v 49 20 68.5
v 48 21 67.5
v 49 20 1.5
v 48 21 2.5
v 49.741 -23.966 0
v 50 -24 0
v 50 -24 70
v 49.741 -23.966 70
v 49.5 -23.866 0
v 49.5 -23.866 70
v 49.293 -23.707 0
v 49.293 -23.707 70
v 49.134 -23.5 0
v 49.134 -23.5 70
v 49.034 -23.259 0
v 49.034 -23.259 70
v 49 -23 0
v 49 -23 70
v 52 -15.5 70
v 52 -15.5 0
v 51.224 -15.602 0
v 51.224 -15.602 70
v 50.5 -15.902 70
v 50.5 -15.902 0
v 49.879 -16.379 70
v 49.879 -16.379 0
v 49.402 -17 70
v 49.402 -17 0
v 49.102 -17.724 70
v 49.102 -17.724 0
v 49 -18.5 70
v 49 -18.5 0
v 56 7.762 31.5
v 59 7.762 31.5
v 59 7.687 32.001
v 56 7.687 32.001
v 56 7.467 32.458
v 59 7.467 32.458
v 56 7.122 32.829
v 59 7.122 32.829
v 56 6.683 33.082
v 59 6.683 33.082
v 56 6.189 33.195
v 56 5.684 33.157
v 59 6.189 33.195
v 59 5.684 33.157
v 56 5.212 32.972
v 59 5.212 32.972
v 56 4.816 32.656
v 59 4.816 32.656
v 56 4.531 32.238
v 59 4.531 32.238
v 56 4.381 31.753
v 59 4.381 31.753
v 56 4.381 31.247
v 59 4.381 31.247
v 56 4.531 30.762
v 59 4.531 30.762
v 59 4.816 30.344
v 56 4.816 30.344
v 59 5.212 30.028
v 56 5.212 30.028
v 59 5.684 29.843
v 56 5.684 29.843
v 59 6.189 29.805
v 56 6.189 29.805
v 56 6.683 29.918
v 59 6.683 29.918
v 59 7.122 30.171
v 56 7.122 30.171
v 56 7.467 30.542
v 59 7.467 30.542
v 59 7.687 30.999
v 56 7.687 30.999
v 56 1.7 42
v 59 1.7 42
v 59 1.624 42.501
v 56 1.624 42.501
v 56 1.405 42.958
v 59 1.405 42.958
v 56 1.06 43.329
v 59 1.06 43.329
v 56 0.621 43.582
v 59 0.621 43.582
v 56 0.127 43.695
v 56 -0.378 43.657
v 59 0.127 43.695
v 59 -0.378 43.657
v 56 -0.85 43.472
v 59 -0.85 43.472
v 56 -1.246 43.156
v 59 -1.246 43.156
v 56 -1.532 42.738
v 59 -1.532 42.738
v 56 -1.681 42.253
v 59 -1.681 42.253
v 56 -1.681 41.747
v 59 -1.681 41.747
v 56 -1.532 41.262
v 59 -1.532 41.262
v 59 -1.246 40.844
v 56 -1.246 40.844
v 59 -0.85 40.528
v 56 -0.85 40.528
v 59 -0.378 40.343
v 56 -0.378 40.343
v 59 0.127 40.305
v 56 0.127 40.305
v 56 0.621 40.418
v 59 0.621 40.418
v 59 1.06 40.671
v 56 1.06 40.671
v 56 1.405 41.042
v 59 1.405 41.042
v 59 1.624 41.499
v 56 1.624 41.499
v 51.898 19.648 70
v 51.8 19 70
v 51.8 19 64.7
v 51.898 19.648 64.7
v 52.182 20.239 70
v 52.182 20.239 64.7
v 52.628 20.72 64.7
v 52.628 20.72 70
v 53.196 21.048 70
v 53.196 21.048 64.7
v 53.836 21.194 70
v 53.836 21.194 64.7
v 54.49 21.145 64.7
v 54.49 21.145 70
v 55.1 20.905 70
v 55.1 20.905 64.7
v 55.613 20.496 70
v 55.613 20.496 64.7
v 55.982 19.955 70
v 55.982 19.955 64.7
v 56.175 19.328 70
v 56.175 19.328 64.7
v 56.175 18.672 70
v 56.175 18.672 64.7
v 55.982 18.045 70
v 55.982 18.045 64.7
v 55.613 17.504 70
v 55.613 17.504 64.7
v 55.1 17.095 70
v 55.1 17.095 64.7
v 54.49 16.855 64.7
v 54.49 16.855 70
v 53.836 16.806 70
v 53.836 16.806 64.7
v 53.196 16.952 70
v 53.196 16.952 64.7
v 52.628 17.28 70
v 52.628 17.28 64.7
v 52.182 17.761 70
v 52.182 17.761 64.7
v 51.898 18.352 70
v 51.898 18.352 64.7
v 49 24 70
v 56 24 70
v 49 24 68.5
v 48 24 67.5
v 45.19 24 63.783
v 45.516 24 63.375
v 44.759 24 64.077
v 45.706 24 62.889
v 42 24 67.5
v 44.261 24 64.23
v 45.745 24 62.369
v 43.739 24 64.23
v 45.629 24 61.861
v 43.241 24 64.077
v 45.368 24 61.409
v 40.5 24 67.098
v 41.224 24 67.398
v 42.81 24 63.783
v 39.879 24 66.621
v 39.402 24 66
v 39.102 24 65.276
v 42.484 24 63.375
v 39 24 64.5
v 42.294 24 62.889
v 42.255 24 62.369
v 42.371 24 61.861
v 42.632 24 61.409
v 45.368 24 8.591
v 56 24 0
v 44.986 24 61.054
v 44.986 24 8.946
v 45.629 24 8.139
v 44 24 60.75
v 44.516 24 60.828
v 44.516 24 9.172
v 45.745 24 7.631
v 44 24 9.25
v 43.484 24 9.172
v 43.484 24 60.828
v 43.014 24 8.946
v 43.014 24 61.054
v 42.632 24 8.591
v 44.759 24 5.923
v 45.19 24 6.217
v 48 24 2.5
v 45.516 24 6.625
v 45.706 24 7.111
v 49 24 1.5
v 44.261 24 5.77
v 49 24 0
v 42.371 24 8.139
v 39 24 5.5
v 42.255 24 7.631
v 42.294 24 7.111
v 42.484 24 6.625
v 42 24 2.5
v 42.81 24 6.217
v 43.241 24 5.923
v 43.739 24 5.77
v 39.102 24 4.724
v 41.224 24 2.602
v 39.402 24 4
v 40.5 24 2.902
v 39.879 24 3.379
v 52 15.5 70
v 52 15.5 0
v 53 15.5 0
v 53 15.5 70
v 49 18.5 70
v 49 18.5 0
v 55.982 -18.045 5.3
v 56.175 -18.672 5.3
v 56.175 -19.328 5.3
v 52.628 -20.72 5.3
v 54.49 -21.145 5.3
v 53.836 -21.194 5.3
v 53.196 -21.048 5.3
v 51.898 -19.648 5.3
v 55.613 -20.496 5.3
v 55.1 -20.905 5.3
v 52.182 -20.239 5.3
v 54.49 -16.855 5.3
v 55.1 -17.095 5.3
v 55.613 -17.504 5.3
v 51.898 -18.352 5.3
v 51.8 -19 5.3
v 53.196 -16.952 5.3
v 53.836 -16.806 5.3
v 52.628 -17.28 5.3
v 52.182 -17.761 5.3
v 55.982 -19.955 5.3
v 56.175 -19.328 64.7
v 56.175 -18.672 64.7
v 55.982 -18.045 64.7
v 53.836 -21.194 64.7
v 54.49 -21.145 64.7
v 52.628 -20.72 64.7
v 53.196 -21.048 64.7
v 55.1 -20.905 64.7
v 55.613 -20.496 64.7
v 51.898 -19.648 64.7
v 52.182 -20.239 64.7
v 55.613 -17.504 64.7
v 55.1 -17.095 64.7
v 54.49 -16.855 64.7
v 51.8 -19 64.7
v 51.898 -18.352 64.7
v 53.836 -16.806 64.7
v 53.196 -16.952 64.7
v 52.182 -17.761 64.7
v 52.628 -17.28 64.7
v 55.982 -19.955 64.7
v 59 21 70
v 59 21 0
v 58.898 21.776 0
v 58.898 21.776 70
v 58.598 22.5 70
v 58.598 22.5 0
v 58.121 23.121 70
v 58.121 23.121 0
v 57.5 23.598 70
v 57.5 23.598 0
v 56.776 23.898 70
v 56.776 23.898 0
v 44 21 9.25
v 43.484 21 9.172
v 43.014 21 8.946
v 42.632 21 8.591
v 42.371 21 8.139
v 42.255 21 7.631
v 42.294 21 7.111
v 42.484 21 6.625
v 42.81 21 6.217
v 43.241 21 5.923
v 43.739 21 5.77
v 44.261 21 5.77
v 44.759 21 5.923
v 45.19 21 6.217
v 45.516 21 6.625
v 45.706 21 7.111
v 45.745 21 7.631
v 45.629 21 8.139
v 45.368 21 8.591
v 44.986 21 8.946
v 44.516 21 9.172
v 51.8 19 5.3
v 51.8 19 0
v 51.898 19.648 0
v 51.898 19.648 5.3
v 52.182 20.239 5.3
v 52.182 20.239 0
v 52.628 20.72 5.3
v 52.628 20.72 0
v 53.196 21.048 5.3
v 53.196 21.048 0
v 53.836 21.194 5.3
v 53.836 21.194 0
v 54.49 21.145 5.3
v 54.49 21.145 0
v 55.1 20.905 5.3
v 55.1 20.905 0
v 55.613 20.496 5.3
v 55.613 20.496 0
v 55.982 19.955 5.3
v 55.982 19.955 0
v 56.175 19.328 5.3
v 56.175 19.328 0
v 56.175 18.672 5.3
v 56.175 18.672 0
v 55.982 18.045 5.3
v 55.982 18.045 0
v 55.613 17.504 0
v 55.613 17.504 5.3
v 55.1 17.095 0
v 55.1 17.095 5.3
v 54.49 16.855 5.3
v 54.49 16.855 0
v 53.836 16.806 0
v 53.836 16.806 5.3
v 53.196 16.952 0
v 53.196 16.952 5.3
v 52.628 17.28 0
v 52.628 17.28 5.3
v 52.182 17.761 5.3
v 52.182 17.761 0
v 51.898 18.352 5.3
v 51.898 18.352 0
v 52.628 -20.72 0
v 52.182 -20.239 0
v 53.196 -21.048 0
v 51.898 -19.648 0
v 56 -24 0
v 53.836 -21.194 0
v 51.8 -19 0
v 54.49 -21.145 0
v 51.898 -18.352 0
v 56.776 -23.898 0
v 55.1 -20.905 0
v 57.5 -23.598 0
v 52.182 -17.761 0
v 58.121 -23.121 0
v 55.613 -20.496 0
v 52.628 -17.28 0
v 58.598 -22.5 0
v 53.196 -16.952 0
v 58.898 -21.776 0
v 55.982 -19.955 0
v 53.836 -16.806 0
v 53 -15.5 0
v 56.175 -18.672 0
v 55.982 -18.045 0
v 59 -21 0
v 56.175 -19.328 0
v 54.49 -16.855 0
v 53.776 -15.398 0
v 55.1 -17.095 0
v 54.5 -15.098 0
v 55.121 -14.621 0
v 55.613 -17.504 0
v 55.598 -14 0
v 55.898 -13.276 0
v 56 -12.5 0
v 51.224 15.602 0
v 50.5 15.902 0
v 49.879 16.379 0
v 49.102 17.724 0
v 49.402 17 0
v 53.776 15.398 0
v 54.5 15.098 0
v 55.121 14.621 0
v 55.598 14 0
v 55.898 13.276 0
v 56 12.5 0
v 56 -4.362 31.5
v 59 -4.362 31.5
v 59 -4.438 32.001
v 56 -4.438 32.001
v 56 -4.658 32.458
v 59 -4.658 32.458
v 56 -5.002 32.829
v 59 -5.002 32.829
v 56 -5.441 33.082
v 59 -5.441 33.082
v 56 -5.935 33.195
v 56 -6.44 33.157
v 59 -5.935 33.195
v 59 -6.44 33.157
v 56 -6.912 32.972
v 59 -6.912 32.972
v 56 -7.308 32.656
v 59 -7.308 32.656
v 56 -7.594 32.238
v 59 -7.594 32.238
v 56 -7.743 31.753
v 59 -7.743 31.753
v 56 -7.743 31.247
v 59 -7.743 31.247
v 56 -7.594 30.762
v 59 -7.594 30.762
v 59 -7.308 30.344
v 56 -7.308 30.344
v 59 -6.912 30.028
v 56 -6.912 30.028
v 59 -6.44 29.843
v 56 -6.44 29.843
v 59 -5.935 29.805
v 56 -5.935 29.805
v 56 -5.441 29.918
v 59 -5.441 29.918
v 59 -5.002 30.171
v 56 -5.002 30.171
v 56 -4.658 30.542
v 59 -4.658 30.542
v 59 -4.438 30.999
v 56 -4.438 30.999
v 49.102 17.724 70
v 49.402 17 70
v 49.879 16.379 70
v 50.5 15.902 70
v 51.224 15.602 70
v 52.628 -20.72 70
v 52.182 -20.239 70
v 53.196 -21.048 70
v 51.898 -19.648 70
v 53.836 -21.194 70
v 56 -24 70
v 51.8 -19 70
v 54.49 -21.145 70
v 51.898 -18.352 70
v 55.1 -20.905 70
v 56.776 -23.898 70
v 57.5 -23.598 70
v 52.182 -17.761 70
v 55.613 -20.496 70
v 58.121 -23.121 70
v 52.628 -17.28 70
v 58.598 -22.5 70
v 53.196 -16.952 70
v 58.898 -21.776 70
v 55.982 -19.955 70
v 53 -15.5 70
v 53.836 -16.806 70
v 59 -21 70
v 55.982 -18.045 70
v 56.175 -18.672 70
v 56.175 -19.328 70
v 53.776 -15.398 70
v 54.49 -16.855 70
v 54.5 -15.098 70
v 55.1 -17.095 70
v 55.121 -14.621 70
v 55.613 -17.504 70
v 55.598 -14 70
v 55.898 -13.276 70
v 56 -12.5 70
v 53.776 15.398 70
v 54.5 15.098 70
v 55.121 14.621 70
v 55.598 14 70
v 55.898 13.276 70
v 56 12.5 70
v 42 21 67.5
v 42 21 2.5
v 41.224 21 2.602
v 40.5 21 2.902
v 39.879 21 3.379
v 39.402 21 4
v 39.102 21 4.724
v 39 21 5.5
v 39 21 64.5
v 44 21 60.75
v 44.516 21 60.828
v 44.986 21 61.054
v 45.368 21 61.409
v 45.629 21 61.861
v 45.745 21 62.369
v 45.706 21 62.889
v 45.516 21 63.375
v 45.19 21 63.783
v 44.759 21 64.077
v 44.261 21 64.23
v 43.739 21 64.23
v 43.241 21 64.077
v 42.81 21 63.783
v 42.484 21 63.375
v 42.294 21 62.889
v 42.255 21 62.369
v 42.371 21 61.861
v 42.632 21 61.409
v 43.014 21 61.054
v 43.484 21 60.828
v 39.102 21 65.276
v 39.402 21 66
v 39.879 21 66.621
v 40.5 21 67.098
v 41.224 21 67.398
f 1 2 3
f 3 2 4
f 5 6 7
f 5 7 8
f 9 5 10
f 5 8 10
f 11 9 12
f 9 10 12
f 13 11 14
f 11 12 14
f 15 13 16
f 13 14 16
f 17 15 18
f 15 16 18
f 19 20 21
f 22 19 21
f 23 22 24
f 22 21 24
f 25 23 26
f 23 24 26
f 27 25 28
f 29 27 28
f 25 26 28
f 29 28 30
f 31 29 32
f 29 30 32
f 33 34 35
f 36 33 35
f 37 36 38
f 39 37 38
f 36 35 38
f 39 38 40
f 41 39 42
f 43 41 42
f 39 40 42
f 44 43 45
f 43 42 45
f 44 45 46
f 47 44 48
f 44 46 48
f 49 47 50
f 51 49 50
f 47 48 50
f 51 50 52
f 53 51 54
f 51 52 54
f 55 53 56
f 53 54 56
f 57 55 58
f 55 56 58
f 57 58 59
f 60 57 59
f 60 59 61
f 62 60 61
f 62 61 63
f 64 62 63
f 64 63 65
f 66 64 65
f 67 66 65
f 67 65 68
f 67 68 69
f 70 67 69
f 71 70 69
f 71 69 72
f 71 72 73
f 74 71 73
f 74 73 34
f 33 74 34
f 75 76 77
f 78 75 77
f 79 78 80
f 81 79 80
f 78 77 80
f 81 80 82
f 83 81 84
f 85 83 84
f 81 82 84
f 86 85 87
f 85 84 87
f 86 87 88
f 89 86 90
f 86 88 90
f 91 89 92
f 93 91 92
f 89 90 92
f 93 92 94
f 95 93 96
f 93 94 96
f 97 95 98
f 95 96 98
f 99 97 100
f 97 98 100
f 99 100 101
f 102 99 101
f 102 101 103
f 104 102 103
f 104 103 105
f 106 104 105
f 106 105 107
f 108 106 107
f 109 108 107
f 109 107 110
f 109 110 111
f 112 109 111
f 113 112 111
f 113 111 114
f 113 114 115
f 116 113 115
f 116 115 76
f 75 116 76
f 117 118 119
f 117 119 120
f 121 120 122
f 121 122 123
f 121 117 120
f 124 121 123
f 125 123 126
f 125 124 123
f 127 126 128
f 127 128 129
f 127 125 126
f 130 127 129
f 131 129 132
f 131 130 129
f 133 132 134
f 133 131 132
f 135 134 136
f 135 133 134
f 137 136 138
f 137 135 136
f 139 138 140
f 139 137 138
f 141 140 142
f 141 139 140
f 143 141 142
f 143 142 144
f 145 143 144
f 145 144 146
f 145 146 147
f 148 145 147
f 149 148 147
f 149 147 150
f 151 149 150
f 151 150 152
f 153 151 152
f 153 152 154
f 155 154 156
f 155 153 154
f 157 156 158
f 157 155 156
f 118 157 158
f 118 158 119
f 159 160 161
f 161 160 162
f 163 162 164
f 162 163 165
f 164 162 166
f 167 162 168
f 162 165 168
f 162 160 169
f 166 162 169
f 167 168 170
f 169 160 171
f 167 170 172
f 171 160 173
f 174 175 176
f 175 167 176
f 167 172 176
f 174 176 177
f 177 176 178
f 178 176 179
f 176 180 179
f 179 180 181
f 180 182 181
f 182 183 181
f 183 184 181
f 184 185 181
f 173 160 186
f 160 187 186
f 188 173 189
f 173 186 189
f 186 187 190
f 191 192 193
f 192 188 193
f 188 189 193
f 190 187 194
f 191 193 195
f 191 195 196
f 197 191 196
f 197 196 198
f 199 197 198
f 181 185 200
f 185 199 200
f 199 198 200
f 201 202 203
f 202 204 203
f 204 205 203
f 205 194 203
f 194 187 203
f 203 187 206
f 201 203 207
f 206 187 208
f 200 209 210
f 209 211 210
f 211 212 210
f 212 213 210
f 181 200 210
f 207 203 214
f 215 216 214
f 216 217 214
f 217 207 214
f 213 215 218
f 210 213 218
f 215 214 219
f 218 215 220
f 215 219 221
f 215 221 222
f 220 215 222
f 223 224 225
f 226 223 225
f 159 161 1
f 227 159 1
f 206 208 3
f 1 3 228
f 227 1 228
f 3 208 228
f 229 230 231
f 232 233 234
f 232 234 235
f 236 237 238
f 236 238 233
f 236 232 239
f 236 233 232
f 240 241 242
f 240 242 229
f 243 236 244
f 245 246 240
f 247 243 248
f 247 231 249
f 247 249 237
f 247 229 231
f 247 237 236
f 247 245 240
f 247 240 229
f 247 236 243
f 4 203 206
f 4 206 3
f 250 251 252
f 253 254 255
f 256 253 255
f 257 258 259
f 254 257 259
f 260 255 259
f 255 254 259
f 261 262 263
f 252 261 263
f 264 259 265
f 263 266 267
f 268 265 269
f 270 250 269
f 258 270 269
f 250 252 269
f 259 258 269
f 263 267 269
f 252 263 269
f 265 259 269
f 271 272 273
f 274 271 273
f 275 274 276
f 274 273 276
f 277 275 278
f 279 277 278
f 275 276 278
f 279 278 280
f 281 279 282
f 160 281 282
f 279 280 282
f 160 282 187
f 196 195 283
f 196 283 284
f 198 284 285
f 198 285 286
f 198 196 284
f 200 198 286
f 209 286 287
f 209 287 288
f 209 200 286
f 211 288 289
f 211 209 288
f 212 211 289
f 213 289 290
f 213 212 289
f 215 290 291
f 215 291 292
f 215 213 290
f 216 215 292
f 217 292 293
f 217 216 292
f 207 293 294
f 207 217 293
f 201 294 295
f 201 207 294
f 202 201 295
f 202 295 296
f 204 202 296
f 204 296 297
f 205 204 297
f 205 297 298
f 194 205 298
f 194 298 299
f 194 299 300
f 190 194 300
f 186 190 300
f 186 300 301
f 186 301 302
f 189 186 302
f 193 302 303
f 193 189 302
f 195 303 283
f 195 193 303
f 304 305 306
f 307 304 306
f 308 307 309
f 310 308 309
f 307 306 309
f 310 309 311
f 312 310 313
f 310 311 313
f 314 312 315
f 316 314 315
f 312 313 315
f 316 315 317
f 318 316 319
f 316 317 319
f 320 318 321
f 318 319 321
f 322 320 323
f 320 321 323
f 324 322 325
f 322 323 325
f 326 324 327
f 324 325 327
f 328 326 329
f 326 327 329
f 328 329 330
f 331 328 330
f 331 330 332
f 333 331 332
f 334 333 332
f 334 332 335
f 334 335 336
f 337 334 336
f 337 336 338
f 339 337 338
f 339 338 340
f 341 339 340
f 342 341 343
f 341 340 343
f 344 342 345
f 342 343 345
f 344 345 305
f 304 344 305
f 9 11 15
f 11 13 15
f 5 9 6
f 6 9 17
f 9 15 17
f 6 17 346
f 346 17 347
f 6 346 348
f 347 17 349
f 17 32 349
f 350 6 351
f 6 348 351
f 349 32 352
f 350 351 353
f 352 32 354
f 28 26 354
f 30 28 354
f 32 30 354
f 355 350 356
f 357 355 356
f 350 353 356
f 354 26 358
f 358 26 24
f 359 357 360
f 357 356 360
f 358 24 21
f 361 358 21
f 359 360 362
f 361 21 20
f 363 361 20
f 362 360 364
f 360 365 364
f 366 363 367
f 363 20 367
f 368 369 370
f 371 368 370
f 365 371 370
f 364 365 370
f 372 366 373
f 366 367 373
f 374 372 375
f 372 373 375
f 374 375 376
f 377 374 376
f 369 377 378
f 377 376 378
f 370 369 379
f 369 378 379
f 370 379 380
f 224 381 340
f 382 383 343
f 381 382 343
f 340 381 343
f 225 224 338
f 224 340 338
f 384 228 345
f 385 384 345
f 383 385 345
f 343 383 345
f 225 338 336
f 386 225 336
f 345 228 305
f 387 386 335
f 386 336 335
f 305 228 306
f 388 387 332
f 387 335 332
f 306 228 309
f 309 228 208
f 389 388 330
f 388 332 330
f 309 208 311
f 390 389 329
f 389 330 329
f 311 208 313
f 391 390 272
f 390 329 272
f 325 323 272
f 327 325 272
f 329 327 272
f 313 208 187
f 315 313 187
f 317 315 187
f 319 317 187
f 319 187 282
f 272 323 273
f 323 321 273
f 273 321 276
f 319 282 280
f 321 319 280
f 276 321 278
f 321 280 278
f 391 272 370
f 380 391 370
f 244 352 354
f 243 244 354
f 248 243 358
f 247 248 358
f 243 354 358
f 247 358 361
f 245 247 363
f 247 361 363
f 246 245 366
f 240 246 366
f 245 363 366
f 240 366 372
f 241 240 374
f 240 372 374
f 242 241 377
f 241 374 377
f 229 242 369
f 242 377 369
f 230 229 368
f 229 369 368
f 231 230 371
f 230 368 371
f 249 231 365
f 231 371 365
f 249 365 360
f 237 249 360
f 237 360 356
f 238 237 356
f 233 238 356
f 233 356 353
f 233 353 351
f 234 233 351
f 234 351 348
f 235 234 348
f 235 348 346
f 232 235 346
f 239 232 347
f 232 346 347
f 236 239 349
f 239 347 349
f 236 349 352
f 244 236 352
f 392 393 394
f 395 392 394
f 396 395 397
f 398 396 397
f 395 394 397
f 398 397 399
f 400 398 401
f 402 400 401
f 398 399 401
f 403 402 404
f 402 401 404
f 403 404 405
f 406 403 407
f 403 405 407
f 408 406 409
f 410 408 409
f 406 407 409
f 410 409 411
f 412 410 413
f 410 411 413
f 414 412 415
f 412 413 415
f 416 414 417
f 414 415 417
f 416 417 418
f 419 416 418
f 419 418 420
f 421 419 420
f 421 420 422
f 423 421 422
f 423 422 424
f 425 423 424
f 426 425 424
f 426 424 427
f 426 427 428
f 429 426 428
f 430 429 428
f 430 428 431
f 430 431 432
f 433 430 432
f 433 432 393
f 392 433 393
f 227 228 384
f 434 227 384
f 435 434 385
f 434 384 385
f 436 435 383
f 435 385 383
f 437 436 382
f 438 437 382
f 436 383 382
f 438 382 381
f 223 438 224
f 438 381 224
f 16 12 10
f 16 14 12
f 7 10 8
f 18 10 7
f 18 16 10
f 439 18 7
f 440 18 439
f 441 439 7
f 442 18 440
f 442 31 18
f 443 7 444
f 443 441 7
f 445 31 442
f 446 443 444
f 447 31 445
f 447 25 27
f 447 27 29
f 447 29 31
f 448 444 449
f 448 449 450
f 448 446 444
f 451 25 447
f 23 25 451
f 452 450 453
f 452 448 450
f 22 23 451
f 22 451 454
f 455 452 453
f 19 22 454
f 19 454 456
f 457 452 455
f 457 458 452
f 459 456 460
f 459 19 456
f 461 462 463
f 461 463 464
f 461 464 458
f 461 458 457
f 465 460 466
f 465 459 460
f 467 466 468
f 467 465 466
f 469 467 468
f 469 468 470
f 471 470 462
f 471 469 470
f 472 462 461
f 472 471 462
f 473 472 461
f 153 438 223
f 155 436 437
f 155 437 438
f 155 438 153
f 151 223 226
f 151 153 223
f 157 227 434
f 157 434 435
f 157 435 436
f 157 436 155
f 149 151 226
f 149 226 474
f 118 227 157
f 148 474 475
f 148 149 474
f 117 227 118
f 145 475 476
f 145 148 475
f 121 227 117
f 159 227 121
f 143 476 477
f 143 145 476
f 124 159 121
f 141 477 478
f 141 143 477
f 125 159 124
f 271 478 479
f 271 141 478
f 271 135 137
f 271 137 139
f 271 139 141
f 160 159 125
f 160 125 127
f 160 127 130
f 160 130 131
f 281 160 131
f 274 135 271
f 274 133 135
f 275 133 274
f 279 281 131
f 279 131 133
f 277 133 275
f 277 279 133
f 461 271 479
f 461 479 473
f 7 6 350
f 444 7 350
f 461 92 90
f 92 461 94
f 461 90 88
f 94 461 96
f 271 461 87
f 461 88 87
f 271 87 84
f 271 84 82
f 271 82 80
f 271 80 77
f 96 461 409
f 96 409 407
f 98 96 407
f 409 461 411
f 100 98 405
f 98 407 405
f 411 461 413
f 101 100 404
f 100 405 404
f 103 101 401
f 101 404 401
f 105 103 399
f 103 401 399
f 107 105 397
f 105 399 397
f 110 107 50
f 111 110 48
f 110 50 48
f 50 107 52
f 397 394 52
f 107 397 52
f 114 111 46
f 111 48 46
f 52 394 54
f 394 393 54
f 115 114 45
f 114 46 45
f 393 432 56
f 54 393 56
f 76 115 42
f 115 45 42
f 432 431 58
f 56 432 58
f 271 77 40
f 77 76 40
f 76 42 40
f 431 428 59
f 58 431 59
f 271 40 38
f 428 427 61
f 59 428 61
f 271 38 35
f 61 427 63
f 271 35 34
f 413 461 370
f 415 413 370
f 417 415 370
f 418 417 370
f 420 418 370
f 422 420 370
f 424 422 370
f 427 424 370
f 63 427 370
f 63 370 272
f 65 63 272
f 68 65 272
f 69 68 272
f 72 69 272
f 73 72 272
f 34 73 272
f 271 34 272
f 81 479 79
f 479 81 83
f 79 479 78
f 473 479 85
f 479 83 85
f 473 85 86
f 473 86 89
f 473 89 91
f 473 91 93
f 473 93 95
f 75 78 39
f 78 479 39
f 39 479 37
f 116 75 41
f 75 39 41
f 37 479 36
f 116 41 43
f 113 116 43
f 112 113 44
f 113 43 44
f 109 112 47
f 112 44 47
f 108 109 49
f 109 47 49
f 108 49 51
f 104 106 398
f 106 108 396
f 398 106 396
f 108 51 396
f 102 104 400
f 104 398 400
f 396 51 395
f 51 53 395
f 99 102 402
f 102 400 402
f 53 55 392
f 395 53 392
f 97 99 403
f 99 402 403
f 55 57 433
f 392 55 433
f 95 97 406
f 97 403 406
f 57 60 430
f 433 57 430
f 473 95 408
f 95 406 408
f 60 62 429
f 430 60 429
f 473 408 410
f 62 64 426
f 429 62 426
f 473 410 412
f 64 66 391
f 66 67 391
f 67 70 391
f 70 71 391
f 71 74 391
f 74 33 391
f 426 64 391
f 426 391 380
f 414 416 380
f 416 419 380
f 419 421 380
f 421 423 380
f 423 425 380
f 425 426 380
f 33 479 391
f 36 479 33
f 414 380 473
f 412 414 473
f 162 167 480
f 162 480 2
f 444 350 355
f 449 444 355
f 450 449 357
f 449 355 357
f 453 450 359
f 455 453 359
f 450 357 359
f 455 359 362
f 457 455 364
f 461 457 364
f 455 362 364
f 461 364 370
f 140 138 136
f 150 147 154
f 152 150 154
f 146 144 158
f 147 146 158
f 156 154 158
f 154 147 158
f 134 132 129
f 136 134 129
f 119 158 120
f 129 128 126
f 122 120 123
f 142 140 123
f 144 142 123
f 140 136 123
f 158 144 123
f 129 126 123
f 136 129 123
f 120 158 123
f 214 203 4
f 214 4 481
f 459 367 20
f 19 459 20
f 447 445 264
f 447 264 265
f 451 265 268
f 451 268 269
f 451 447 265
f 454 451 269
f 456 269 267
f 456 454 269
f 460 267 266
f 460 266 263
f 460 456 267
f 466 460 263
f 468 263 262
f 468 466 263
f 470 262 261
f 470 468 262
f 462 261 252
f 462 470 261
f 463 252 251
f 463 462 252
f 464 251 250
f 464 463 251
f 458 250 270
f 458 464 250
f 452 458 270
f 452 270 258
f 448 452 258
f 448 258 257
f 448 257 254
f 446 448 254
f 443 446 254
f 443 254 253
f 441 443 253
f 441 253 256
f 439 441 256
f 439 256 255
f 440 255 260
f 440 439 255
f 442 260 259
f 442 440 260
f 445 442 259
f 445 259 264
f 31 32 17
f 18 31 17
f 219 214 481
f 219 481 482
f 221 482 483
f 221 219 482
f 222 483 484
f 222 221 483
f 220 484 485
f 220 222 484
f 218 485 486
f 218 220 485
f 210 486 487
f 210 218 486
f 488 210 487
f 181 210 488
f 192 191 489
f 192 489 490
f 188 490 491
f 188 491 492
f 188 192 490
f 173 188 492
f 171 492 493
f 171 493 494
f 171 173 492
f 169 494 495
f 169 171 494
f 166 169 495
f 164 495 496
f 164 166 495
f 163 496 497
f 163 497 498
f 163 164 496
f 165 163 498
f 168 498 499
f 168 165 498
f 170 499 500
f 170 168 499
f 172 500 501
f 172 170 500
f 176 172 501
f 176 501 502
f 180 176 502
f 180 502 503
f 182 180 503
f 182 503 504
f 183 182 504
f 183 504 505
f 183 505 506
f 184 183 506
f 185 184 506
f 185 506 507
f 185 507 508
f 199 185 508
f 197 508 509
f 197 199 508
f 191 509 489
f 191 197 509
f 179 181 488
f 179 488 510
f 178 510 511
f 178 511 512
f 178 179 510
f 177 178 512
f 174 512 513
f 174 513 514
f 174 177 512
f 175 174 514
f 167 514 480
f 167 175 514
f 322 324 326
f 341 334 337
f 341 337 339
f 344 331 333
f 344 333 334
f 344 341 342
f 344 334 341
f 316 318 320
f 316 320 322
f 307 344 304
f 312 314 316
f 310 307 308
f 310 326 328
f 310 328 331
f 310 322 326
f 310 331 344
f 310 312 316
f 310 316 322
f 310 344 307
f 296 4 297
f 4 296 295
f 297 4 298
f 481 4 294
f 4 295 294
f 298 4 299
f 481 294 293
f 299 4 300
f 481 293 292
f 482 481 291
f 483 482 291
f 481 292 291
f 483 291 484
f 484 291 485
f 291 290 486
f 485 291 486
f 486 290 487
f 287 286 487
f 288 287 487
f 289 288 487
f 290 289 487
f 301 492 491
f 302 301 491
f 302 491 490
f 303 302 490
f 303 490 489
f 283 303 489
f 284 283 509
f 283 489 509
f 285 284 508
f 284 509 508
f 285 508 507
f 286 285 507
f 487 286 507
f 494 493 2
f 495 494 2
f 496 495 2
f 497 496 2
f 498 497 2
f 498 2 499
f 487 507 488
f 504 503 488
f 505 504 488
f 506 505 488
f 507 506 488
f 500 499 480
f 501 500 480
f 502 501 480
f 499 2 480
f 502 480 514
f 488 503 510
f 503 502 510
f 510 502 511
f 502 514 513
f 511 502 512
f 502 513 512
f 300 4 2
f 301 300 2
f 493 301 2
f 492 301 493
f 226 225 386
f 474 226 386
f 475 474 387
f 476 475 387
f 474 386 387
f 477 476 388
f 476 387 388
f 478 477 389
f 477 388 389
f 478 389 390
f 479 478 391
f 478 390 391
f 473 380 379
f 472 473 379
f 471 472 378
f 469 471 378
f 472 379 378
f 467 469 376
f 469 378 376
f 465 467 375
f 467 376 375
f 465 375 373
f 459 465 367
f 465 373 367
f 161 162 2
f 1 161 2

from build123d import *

# Parameters (mm, degrees)
BOSS_EXTRUDE1_DEPTH = 70
SKETCH2_R           = 2.2
CUT_EXTRUDE1_DEPTH  = 5.3
FILLET1_R           = 1
SKETCH4_R           = 1.7
CUT_EXTRUDE3_DEPTH  = 10
SKETCH5_R           = 1.75
BOSS_EXTRUDE2_DEPTH = 3
CHAMFER1_SIZE       = 1


with BuildPart() as part:
    # Sketch1 → Boss-Extrude1 (new body)
    with BuildSketch(Plane.XY):
        with BuildLine():
            Line((49, 24), (49, 18.5))
            ThreePointArc((49, 18.5), (49.878679656, 16.378679656), (52, 15.5))
            Line((52, 15.5), (53, 15.5))
            ThreePointArc((53, 15.5), (55.121320344, 14.621320344), (56, 12.5))
            Line((56, 12.5), (56, -12.5))
            ThreePointArc((56, -12.5), (55.121320344, -14.621320344), (53, -15.5))
            Line((53, -15.5), (52, -15.5))
            ThreePointArc((52, -15.5), (49.878679656, -16.378679656), (49, -18.5))
            Line((49, -18.5), (49, -24))
            Line((49, -24), (56, -24))
            ThreePointArc((56, -24), (58.121320344, -23.121320344), (59, -21))
            Line((59, -21), (59, 21))
            ThreePointArc((59, 21), (58.121320344, 23.121320344), (56, 24))
            Line((56, 24), (49, 24))
        make_face()
    extrude(amount=BOSS_EXTRUDE1_DEPTH)

    # Sketch2 → Cut-Extrude1 (cut)
    with BuildSketch(Plane(origin=(0, 0, 0), x_dir=(-1, 0, 0), z_dir=(0, 0, -1))):
        with Locations((-54, -19)):
            Circle(SKETCH2_R)
        with Locations((-54, 19)):
            Circle(SKETCH2_R)
    cut_extrude1 = extrude(amount=-CUT_EXTRUDE1_DEPTH, mode=Mode.SUBTRACT)

    # Mirror1: Cut-Extrude1 across plane
    add(cut_extrude1.mirror(Plane(origin=(0, 0, 35), x_dir=(1, 0, 0), z_dir=(0, 0, -1))), mode=Mode.SUBTRACT)

    # Fillet1
    fillet1_edges = [part.edges().sort_by_distance(p)[0] for p in [
        (49, -24, 35),
    ]]
    fillet(fillet1_edges, radius=FILLET1_R)

    # Sketch4 → Cut-Extrude3 (cut)
    with BuildSketch(Plane(origin=(59, 0, 0), x_dir=(0, 0, -1), z_dir=(1, 0, 0))):
        with Locations(Location((-42, 0, 0), (0, 0, 90))):
            Circle(SKETCH4_R)
        with Locations(Location((-31.5, 6.062177826, 0), (0, 0, 90))):
            Circle(SKETCH4_R)
        with Locations(Location((-31.5, -6.062177826, 0), (0, 0, 90))):
            Circle(SKETCH4_R)
    extrude(amount=-CUT_EXTRUDE3_DEPTH, mode=Mode.SUBTRACT)

    # Sketch5 → Boss-Extrude2 (add)
    with BuildSketch(Plane.XZ.offset(-24)):
        with BuildLine():
            Line((49, 2.5), (42, 2.5))
            ThreePointArc((42, 2.5), (39.878679656, 3.378679656), (39, 5.5))
            Line((39, 5.5), (39, 64.5))
            ThreePointArc((39, 64.5), (39.878679656, 66.621320344), (42, 67.5))
            Line((42, 67.5), (49, 67.5))
            Line((49, 67.5), (49, 2.5))
        make_face()
        with Locations(Location((44, 62.5, 0), (0, 0, 270))):
            Circle(SKETCH5_R, mode=Mode.SUBTRACT)
        with Locations(Location((44, 7.5, 0), (0, 0, 90))):
            Circle(SKETCH5_R, mode=Mode.SUBTRACT)
    extrude(amount=BOSS_EXTRUDE2_DEPTH)

    # Chamfer1
    chamfer1_edges = [part.edges().sort_by_distance(p)[0] for p in [
        (49, 21, 35),
        (49, 22.5, 2.5),
        (49, 22.5, 67.5),
    ]]
    chamfer(chamfer1_edges, length=CHAMFER1_SIZE)


solid = part.part
